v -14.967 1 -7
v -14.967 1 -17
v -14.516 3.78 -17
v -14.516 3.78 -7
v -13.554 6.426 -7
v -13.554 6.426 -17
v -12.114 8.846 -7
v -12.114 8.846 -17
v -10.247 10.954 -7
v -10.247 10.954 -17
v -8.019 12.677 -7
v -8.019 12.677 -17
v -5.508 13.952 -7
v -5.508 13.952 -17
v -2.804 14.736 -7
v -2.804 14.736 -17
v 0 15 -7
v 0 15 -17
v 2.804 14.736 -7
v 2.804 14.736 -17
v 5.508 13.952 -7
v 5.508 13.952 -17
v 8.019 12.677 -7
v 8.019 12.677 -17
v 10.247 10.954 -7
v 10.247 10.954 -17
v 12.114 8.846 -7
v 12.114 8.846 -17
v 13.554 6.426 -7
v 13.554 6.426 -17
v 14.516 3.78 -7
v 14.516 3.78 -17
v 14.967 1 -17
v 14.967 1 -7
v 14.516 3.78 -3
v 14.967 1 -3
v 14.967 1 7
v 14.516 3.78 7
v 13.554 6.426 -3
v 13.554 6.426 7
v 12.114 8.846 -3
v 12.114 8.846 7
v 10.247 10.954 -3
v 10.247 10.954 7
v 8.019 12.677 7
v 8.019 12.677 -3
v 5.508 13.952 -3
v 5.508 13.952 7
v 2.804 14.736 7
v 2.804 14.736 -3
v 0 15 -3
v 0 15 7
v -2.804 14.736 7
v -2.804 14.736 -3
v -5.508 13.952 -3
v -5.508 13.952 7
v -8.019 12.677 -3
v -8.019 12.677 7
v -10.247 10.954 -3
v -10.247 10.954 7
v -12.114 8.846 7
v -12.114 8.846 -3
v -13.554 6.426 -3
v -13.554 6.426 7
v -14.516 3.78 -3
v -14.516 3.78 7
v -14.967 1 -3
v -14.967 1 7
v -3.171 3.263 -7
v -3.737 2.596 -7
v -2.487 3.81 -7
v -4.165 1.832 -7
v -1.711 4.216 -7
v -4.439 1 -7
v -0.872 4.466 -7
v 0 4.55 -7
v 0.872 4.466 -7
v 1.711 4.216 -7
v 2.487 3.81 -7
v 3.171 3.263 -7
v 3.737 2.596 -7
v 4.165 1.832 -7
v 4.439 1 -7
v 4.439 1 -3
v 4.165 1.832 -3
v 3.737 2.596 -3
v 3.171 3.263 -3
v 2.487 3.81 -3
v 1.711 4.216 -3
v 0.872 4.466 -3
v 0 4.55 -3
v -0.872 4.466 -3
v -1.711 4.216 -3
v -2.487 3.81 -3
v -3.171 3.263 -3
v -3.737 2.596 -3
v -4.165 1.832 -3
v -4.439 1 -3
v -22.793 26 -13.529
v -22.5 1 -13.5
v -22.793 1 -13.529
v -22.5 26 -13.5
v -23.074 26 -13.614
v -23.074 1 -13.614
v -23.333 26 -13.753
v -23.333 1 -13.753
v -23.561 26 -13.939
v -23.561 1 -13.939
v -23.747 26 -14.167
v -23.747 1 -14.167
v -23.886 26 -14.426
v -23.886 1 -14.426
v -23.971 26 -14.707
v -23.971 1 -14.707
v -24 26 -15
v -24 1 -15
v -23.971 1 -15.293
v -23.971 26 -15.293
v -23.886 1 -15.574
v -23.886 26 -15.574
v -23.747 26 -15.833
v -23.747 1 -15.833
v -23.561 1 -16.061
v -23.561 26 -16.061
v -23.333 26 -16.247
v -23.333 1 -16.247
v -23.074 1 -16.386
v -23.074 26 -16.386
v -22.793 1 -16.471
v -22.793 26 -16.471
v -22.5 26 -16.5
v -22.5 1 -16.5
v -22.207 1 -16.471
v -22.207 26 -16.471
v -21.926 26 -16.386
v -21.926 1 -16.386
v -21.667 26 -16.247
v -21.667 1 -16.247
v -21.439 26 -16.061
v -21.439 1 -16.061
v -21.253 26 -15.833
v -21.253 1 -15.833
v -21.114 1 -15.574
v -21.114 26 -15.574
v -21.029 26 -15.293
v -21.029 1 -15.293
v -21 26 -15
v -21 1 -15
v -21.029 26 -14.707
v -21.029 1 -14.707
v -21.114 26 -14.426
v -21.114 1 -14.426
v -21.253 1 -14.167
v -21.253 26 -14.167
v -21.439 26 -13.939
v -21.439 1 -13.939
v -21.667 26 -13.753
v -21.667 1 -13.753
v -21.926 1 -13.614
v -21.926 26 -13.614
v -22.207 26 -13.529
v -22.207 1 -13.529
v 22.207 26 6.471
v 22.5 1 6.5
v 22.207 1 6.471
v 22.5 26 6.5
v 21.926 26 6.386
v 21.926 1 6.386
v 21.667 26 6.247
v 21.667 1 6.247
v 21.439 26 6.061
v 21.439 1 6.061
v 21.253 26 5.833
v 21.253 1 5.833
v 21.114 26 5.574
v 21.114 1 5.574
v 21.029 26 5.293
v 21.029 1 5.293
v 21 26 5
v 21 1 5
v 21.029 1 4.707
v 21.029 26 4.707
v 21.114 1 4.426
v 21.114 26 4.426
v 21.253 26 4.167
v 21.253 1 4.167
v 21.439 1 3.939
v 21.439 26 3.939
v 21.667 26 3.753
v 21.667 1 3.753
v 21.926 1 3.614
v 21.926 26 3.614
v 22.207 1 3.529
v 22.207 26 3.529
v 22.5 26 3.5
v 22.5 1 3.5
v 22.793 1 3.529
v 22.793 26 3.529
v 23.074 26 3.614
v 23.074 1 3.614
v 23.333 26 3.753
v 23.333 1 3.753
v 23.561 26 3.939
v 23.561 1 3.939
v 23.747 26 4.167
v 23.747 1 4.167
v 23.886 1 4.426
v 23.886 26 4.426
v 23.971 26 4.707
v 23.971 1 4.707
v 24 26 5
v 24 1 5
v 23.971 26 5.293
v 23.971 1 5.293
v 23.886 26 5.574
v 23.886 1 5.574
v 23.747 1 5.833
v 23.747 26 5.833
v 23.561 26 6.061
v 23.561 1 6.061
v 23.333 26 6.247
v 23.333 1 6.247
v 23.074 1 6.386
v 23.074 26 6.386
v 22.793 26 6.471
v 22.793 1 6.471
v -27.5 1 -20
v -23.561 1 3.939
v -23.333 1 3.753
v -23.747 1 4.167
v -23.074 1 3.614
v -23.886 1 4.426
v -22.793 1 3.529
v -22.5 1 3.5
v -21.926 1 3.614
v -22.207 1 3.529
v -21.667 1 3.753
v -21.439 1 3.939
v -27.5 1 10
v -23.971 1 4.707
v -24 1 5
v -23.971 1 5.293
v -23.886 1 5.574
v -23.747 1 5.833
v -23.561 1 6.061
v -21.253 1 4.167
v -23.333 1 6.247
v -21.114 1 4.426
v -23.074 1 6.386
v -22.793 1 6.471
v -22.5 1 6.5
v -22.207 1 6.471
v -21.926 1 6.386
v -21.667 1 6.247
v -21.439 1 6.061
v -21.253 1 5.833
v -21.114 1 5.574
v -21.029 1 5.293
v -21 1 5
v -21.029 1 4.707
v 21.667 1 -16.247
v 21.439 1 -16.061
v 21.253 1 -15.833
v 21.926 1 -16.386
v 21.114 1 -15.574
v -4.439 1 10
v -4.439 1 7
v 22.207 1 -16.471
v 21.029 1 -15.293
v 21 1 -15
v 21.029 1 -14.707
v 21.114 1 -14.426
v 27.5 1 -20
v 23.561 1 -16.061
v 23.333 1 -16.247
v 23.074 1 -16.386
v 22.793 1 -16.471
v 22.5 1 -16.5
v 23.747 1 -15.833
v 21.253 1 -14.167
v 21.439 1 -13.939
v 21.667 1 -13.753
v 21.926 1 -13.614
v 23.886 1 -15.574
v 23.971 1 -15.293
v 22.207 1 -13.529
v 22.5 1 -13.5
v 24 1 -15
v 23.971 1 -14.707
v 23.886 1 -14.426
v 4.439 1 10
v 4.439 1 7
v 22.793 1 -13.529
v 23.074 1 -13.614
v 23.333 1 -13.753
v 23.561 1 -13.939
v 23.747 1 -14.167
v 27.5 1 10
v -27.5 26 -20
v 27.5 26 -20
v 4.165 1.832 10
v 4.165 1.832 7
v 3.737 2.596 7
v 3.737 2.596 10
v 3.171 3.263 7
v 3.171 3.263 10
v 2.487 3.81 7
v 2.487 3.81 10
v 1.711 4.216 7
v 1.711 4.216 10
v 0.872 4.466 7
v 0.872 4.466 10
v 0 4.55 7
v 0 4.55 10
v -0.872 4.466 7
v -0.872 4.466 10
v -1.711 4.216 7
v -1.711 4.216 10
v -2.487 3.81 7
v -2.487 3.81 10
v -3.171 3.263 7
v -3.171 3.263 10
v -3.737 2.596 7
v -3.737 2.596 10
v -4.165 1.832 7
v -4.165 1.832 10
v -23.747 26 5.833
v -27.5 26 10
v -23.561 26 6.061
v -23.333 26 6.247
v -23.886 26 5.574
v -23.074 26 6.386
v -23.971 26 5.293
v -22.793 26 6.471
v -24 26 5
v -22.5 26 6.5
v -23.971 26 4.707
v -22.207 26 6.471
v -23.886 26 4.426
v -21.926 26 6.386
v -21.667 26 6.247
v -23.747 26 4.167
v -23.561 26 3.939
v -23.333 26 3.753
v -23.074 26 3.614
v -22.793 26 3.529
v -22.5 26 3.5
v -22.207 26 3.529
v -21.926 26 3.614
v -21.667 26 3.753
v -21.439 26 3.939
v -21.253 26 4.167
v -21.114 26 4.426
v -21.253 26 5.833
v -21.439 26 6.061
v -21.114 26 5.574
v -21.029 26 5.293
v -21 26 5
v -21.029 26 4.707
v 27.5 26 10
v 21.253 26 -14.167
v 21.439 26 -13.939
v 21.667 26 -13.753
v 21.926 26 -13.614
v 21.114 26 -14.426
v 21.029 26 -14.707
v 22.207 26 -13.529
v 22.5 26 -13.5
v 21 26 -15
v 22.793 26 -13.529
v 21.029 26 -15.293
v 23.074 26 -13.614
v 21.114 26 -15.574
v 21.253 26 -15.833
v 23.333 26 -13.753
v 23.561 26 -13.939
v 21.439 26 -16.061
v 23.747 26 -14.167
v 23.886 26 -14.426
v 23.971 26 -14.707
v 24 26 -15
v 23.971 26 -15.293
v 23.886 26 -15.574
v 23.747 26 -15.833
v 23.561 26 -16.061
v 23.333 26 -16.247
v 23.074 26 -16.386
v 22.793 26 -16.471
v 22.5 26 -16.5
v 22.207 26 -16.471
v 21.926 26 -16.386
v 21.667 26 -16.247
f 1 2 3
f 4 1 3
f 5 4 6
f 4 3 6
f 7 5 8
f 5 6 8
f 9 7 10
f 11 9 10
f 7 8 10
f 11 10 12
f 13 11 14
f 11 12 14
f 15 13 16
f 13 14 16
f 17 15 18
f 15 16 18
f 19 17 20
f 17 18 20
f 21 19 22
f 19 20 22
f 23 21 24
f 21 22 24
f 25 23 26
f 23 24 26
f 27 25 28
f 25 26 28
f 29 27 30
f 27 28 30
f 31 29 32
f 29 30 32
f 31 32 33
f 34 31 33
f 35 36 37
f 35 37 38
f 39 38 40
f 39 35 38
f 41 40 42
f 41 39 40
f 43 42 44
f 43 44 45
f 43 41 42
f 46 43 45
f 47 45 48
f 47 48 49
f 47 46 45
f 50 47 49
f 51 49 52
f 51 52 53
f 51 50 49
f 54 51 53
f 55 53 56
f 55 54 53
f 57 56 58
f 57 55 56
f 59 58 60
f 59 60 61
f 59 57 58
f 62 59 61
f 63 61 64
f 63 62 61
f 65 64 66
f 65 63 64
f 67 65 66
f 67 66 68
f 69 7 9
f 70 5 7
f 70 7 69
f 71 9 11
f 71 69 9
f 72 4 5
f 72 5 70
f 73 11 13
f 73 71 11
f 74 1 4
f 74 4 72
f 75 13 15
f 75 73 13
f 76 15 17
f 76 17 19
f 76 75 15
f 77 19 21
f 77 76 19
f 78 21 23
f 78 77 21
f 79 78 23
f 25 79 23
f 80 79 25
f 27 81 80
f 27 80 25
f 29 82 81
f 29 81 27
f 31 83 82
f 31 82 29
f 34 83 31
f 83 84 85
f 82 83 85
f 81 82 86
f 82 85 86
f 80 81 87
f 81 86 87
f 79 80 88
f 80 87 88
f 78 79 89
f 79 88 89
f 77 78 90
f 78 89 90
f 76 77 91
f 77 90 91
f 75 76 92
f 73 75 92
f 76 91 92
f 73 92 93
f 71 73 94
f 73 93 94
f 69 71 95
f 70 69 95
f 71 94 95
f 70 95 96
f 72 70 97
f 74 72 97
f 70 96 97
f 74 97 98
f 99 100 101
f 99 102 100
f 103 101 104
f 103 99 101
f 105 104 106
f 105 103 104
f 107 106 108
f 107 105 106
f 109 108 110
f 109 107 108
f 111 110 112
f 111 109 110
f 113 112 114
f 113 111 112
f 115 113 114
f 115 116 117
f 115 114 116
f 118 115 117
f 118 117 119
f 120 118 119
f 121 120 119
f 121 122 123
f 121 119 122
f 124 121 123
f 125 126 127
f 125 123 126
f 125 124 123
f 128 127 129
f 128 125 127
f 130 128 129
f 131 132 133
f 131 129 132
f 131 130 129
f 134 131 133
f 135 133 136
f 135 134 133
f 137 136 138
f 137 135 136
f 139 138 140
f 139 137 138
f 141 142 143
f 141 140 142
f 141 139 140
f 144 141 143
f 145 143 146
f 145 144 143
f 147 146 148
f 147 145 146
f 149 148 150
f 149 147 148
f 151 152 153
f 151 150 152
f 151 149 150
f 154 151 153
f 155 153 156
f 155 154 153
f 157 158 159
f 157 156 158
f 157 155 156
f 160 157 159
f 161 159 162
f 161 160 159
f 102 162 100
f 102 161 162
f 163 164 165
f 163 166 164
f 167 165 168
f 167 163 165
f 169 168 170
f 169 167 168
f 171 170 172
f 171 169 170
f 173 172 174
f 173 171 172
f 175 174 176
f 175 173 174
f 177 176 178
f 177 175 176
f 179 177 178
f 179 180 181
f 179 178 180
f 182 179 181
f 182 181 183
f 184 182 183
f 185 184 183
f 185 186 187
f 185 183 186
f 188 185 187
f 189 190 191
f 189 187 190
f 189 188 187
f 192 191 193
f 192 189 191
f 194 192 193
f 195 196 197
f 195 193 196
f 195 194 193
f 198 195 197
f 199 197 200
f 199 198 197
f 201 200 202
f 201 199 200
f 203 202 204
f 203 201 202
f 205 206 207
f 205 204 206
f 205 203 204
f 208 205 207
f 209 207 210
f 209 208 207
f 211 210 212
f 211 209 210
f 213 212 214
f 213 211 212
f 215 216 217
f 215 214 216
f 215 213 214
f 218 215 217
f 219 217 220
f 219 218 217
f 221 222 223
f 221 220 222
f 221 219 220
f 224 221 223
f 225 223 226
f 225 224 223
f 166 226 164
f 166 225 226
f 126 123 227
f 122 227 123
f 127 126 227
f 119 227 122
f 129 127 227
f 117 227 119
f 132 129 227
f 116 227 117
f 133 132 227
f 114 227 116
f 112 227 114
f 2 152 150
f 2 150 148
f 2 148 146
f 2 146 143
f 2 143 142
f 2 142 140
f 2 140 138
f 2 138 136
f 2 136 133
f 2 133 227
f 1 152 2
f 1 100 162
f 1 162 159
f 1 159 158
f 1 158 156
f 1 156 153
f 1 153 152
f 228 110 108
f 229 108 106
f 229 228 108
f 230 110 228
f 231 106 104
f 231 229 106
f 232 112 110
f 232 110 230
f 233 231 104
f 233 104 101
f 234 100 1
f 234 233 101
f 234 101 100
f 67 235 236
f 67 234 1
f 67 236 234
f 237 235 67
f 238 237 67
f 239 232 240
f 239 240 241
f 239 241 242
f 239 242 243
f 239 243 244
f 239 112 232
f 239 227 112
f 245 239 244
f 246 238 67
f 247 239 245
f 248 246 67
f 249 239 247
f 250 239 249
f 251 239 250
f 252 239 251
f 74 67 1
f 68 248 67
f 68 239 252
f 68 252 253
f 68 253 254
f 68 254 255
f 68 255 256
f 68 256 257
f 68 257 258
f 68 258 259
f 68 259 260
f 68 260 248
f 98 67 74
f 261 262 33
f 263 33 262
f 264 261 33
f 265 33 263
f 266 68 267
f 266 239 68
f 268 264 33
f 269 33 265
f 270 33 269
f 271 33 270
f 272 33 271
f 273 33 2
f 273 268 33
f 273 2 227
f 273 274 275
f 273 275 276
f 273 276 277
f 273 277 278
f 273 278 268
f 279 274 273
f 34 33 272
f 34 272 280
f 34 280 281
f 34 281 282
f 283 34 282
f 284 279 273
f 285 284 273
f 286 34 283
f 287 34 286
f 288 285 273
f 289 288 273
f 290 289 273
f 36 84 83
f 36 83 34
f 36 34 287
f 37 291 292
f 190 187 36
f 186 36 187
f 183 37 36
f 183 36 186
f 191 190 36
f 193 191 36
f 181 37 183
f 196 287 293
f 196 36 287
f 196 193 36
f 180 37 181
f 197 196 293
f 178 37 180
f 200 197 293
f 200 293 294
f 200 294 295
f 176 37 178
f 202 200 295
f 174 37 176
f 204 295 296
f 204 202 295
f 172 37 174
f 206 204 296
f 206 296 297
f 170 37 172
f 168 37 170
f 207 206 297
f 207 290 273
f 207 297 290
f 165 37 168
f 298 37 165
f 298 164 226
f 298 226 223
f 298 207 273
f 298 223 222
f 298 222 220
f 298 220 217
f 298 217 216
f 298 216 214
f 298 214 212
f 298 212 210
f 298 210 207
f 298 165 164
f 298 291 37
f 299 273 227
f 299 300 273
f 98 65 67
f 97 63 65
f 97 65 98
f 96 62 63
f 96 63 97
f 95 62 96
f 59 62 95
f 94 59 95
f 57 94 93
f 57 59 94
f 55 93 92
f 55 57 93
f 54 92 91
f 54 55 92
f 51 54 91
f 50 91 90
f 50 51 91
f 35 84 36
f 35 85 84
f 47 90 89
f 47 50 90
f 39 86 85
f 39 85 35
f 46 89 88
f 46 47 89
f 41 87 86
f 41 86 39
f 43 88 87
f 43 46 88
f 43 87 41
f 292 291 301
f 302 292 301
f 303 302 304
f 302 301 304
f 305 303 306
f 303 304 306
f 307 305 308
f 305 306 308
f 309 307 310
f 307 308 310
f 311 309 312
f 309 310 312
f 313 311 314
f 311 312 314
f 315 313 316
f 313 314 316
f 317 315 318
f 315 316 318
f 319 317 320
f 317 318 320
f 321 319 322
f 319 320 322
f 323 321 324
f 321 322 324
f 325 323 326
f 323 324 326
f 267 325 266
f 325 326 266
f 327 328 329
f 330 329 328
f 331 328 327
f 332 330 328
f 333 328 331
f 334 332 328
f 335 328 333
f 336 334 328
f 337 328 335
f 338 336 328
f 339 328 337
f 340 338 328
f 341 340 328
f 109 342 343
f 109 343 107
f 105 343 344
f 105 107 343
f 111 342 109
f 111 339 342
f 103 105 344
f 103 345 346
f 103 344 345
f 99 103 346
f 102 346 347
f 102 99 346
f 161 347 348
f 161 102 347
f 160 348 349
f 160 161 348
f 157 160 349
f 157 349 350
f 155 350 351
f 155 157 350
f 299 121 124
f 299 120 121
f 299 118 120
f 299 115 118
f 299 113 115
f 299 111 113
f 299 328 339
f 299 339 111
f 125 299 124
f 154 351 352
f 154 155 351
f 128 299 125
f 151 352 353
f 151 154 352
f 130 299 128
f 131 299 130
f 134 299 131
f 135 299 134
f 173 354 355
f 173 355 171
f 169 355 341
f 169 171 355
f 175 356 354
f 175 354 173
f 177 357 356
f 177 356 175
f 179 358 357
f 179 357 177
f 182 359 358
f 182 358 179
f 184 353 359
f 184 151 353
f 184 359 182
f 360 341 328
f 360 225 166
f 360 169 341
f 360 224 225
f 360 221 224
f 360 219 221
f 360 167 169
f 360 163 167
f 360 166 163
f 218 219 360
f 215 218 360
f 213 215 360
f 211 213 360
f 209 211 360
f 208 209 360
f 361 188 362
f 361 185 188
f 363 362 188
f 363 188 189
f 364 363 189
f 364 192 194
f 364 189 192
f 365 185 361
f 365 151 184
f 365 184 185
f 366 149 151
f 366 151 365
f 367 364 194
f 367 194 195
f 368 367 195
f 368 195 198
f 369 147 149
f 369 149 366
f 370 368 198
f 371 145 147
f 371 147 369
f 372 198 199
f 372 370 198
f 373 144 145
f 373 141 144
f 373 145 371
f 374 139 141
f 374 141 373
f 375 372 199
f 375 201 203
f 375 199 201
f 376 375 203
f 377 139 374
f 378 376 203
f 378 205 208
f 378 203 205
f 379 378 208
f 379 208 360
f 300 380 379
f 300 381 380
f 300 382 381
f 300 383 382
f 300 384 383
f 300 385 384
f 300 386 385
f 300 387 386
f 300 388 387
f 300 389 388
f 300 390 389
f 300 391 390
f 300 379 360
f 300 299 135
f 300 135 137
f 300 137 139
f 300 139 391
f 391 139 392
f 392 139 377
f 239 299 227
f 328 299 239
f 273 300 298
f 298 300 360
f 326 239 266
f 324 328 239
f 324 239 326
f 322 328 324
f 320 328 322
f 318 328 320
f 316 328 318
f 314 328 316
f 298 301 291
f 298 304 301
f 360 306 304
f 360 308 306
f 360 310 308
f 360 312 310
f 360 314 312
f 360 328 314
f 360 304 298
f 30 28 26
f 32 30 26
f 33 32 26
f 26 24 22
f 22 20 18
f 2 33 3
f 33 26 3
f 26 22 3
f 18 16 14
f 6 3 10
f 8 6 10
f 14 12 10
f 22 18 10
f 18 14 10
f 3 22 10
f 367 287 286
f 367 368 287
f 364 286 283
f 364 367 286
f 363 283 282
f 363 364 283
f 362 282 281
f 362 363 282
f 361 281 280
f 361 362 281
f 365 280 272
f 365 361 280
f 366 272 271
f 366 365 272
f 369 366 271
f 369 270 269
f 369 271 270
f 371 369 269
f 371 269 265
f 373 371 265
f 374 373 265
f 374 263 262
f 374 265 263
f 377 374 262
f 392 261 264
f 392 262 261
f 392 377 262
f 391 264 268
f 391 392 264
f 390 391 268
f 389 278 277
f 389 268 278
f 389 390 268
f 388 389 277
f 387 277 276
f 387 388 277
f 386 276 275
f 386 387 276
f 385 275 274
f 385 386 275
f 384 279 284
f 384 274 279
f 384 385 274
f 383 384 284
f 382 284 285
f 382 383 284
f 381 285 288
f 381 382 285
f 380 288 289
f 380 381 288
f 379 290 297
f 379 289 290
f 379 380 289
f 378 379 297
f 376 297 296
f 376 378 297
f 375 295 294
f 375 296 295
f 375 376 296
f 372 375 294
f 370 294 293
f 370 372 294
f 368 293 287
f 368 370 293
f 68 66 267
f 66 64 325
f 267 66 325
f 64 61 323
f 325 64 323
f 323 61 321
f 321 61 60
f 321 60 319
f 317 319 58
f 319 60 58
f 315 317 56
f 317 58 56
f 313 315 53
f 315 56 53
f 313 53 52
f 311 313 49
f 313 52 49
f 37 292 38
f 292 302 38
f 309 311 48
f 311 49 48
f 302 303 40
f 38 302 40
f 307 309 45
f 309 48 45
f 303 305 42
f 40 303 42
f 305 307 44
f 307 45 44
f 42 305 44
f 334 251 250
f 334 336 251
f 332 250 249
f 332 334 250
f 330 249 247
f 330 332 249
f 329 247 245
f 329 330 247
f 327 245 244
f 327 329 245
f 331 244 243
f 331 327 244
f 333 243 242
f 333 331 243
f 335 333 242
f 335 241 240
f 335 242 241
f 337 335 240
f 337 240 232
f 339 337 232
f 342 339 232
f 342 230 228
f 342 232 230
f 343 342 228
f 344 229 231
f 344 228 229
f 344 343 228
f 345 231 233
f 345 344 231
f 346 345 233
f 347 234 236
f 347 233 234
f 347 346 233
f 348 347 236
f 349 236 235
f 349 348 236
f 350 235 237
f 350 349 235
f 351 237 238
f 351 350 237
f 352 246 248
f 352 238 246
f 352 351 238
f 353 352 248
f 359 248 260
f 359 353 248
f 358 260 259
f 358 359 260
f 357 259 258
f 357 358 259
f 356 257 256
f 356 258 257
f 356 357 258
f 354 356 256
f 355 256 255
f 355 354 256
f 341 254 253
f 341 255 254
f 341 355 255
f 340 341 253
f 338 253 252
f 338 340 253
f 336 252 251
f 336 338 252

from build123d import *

# Parameters (mm, degrees)
SKETCH_2_R           = 15
EXTRUDE_1_DEPTH      = 10
EXTRUDE_START        = 10
EXTRUDE_2_DEPTH      = 10
SKETCH_4_R           = 15
EXTRUDE_3_DEPTH      = 10
SKETCH_5_R           = 4.55
CUT_EXTRUDE_1_DEPTH  = 43.804789452
SKETCH_6_R           = 1.5
CUT_EXTRUDE_2_DEPTH  = 56.213223054
SKETCH_7_R           = 15
CUT_EXTRUDE_3_DEPTH  = 13
CUT_EXTRUDE_START    = -3
SKETCH_8_R           = 15
CUT_EXTRUDE_4_DEPTH  = 3
SKETCH_10_W          = 10
SKETCH_10_H          = 30
SKETCH_10_R          = 1.5
EXTRUDE_5_DEPTH      = 45
EXTRUDE_6_REACH      = 62.467
EXTRUDE_6_END_RADIUS = 17.5
SKETCH_11_W          = 35
SKETCH_11_H          = 30
SKETCH_12_R          = 15
EXTRUDE_7_DEPTH      = 3
EXTRUDE_START_2      = -3
SKETCH_14_R          = 15
EXTRUDE_9_DEPTH      = 3
SKETCH_16_R          = 4.55
CUT_EXTRUDE_6_DEPTH  = 20
SKETCH_15_W          = 55
SKETCH_15_H          = 30
CUT_EXTRUDE_7_DEPTH  = 25


with BuildPart() as part:
    # 草图2 → 凸台-拉伸1 (new body)
    with BuildSketch(Plane.XY):
        with BuildLine():
            Line((-17.5, 21), (-17.5, 0))
            ThreePointArc((-17.5, 0), (0, -17.5), (17.5, 0))
            Line((17.5, 0), (17.5, 21))
            Line((17.5, 21), (27.5, 21))
            Line((27.5, 21), (27.5, 26))
            Line((27.5, 26), (-27.5, 26))
            Line((-27.5, 26), (-27.5, 21))
            Line((-27.5, 21), (-17.5, 21))
        make_face()
        Circle(SKETCH_2_R, mode=Mode.SUBTRACT)
    extrude(amount=EXTRUDE_1_DEPTH)

    # 草图3 → 凸台-拉伸2 (add)
    with BuildSketch(Plane(origin=(0, 0, 0), x_dir=(-1, 0, 0), z_dir=(0, 0, -1)).offset(EXTRUDE_START)):
        with BuildLine():
            Line((17.5, 0), (17.5, 21))
            Line((17.5, 21), (27.5, 21))
            Line((27.5, 21), (27.5, 26))
            Line((27.5, 26), (-27.5, 26))
            Line((-27.5, 26), (-27.5, 21))
            Line((-27.5, 21), (-17.5, 21))
            Line((-17.5, 21), (-17.5, 0))
            ThreePointArc((-17.5, 0), (0, -17.5), (17.5, 0))
        make_face()
    extrude(amount=-EXTRUDE_2_DEPTH)

    # 草图4 → 凸台-拉伸3 (add)
    with BuildSketch(Plane(origin=(0, 0, -10), x_dir=(-1, 0, 0), z_dir=(0, 0, -1)).offset(EXTRUDE_START)):
        with BuildLine():
            Line((17.5, 0), (17.5, 21))
            Line((17.5, 21), (27.5, 21))
            Line((27.5, 21), (27.5, 26))
            Line((27.5, 26), (-27.5, 26))
            Line((-27.5, 26), (-27.5, 21))
            Line((-27.5, 21), (-17.5, 21))
            Line((-17.5, 21), (-17.5, 0))
            ThreePointArc((-17.5, 0), (0, -17.5), (17.5, 0))
        make_face()
        Circle(SKETCH_4_R, mode=Mode.SUBTRACT)
    extrude(amount=-EXTRUDE_3_DEPTH)

    # 草图5 → 切除-拉伸1 (cut, through all)
    with BuildSketch(Plane.XY):
        Circle(SKETCH_5_R)
    extrude(amount=-CUT_EXTRUDE_1_DEPTH, mode=Mode.SUBTRACT)

    # 草图6 → 切除-拉伸2 (cut, through all)
    with BuildSketch(Plane(origin=(0, 26, 0), x_dir=(1, 0, 0), z_dir=(0, 1, 0))):
        with Locations((-22.5, 15)):
            Circle(SKETCH_6_R)
        with Locations((-22.5, -5)):
            Circle(SKETCH_6_R)
        with Locations((22.5, 15)):
            Circle(SKETCH_6_R)
        with Locations((22.5, -5)):
            Circle(SKETCH_6_R)
    extrude(amount=-CUT_EXTRUDE_2_DEPTH, mode=Mode.SUBTRACT)

    # 草图7 → 切除-拉伸3 (cut)
    with BuildSketch(Plane(origin=(0, 0, -20), x_dir=(-1, 0, 0), z_dir=(0, 0, -1))):
        Circle(SKETCH_7_R)
    extrude(amount=-CUT_EXTRUDE_3_DEPTH, mode=Mode.SUBTRACT)

    # 草图8 → 切除-拉伸4 (cut)
    with BuildSketch(Plane.XY.offset(CUT_EXTRUDE_START)):
        Circle(SKETCH_8_R)
    extrude(amount=CUT_EXTRUDE_4_DEPTH, mode=Mode.SUBTRACT)

    # 草图10 → 凸台-拉伸5 (add)
    # profile 1 of 2: a face of its own
    with BuildSketch(Plane.XZ.offset(-21)):
        with Locations((22.5, -5)):
            Rectangle(SKETCH_10_W, SKETCH_10_H)
        with Locations((22.5, -15)):
            Circle(SKETCH_10_R, mode=Mode.SUBTRACT)
        with Locations((22.5, 5)):
            Circle(SKETCH_10_R, mode=Mode.SUBTRACT)
    # profile 2 of 2: a face of its own
    with BuildSketch(Plane.XZ.offset(-21)):
        with Locations((-22.5, -5)):
            Rectangle(SKETCH_10_W, SKETCH_10_H)
        with Locations((-22.5, 5)):
            Circle(SKETCH_10_R, mode=Mode.SUBTRACT)
        with Locations((-22.5, -15)):
            Circle(SKETCH_10_R, mode=Mode.SUBTRACT)
    extrude(amount=EXTRUDE_5_DEPTH)

    # 凸台-拉伸6: up to this cylinder (the profile starts outside it)
    extrude_6_end = Plane(origin=(0, 0, -5), z_dir=(0, 0, -1)) * Cylinder(EXTRUDE_6_END_RADIUS, 160.934, mode=Mode.PRIVATE)
    # 草图11 → 凸台-拉伸6 (add, up to the surface)
    with BuildSketch(Plane.XZ.offset(24), mode=Mode.PRIVATE) as extrude_6_sk1:
        with Locations((0, -5)):
            Rectangle(SKETCH_11_W, SKETCH_11_H)
    extrude_6_tool1 = extrude(extrude_6_sk1.sketch, amount=-EXTRUDE_6_REACH, mode=Mode.PRIVATE) - extrude_6_end
    add(extrude_6_tool1.solids().sort_by_distance((0, -24, -5))[0])

    # 草图12 → 凸台-拉伸7 (add)
    with BuildSketch(Plane(origin=(0, 0, -20), x_dir=(-1, 0, 0), z_dir=(0, 0, -1))):
        Circle(SKETCH_12_R)
    extrude(amount=-EXTRUDE_7_DEPTH)

    # 草图14 → 凸台-拉伸9 (add)
    with BuildSketch(Plane.XY.offset(10).offset(EXTRUDE_START_2)):
        Circle(SKETCH_14_R)
    extrude(amount=EXTRUDE_9_DEPTH)

    # 草图16 → 切除-拉伸6 (cut)
    with BuildSketch(Plane.XY.offset(10)):
        Circle(SKETCH_16_R)
    extrude(amount=-CUT_EXTRUDE_6_DEPTH, mode=Mode.SUBTRACT)

    # 草图15 → 切除-拉伸7 (cut)
    with BuildSketch(Plane.XZ.offset(24)):
        with Locations((0, -5)):
            Rectangle(SKETCH_15_W, SKETCH_15_H)
    extrude(amount=-CUT_EXTRUDE_7_DEPTH, mode=Mode.SUBTRACT)


solid = part.part
